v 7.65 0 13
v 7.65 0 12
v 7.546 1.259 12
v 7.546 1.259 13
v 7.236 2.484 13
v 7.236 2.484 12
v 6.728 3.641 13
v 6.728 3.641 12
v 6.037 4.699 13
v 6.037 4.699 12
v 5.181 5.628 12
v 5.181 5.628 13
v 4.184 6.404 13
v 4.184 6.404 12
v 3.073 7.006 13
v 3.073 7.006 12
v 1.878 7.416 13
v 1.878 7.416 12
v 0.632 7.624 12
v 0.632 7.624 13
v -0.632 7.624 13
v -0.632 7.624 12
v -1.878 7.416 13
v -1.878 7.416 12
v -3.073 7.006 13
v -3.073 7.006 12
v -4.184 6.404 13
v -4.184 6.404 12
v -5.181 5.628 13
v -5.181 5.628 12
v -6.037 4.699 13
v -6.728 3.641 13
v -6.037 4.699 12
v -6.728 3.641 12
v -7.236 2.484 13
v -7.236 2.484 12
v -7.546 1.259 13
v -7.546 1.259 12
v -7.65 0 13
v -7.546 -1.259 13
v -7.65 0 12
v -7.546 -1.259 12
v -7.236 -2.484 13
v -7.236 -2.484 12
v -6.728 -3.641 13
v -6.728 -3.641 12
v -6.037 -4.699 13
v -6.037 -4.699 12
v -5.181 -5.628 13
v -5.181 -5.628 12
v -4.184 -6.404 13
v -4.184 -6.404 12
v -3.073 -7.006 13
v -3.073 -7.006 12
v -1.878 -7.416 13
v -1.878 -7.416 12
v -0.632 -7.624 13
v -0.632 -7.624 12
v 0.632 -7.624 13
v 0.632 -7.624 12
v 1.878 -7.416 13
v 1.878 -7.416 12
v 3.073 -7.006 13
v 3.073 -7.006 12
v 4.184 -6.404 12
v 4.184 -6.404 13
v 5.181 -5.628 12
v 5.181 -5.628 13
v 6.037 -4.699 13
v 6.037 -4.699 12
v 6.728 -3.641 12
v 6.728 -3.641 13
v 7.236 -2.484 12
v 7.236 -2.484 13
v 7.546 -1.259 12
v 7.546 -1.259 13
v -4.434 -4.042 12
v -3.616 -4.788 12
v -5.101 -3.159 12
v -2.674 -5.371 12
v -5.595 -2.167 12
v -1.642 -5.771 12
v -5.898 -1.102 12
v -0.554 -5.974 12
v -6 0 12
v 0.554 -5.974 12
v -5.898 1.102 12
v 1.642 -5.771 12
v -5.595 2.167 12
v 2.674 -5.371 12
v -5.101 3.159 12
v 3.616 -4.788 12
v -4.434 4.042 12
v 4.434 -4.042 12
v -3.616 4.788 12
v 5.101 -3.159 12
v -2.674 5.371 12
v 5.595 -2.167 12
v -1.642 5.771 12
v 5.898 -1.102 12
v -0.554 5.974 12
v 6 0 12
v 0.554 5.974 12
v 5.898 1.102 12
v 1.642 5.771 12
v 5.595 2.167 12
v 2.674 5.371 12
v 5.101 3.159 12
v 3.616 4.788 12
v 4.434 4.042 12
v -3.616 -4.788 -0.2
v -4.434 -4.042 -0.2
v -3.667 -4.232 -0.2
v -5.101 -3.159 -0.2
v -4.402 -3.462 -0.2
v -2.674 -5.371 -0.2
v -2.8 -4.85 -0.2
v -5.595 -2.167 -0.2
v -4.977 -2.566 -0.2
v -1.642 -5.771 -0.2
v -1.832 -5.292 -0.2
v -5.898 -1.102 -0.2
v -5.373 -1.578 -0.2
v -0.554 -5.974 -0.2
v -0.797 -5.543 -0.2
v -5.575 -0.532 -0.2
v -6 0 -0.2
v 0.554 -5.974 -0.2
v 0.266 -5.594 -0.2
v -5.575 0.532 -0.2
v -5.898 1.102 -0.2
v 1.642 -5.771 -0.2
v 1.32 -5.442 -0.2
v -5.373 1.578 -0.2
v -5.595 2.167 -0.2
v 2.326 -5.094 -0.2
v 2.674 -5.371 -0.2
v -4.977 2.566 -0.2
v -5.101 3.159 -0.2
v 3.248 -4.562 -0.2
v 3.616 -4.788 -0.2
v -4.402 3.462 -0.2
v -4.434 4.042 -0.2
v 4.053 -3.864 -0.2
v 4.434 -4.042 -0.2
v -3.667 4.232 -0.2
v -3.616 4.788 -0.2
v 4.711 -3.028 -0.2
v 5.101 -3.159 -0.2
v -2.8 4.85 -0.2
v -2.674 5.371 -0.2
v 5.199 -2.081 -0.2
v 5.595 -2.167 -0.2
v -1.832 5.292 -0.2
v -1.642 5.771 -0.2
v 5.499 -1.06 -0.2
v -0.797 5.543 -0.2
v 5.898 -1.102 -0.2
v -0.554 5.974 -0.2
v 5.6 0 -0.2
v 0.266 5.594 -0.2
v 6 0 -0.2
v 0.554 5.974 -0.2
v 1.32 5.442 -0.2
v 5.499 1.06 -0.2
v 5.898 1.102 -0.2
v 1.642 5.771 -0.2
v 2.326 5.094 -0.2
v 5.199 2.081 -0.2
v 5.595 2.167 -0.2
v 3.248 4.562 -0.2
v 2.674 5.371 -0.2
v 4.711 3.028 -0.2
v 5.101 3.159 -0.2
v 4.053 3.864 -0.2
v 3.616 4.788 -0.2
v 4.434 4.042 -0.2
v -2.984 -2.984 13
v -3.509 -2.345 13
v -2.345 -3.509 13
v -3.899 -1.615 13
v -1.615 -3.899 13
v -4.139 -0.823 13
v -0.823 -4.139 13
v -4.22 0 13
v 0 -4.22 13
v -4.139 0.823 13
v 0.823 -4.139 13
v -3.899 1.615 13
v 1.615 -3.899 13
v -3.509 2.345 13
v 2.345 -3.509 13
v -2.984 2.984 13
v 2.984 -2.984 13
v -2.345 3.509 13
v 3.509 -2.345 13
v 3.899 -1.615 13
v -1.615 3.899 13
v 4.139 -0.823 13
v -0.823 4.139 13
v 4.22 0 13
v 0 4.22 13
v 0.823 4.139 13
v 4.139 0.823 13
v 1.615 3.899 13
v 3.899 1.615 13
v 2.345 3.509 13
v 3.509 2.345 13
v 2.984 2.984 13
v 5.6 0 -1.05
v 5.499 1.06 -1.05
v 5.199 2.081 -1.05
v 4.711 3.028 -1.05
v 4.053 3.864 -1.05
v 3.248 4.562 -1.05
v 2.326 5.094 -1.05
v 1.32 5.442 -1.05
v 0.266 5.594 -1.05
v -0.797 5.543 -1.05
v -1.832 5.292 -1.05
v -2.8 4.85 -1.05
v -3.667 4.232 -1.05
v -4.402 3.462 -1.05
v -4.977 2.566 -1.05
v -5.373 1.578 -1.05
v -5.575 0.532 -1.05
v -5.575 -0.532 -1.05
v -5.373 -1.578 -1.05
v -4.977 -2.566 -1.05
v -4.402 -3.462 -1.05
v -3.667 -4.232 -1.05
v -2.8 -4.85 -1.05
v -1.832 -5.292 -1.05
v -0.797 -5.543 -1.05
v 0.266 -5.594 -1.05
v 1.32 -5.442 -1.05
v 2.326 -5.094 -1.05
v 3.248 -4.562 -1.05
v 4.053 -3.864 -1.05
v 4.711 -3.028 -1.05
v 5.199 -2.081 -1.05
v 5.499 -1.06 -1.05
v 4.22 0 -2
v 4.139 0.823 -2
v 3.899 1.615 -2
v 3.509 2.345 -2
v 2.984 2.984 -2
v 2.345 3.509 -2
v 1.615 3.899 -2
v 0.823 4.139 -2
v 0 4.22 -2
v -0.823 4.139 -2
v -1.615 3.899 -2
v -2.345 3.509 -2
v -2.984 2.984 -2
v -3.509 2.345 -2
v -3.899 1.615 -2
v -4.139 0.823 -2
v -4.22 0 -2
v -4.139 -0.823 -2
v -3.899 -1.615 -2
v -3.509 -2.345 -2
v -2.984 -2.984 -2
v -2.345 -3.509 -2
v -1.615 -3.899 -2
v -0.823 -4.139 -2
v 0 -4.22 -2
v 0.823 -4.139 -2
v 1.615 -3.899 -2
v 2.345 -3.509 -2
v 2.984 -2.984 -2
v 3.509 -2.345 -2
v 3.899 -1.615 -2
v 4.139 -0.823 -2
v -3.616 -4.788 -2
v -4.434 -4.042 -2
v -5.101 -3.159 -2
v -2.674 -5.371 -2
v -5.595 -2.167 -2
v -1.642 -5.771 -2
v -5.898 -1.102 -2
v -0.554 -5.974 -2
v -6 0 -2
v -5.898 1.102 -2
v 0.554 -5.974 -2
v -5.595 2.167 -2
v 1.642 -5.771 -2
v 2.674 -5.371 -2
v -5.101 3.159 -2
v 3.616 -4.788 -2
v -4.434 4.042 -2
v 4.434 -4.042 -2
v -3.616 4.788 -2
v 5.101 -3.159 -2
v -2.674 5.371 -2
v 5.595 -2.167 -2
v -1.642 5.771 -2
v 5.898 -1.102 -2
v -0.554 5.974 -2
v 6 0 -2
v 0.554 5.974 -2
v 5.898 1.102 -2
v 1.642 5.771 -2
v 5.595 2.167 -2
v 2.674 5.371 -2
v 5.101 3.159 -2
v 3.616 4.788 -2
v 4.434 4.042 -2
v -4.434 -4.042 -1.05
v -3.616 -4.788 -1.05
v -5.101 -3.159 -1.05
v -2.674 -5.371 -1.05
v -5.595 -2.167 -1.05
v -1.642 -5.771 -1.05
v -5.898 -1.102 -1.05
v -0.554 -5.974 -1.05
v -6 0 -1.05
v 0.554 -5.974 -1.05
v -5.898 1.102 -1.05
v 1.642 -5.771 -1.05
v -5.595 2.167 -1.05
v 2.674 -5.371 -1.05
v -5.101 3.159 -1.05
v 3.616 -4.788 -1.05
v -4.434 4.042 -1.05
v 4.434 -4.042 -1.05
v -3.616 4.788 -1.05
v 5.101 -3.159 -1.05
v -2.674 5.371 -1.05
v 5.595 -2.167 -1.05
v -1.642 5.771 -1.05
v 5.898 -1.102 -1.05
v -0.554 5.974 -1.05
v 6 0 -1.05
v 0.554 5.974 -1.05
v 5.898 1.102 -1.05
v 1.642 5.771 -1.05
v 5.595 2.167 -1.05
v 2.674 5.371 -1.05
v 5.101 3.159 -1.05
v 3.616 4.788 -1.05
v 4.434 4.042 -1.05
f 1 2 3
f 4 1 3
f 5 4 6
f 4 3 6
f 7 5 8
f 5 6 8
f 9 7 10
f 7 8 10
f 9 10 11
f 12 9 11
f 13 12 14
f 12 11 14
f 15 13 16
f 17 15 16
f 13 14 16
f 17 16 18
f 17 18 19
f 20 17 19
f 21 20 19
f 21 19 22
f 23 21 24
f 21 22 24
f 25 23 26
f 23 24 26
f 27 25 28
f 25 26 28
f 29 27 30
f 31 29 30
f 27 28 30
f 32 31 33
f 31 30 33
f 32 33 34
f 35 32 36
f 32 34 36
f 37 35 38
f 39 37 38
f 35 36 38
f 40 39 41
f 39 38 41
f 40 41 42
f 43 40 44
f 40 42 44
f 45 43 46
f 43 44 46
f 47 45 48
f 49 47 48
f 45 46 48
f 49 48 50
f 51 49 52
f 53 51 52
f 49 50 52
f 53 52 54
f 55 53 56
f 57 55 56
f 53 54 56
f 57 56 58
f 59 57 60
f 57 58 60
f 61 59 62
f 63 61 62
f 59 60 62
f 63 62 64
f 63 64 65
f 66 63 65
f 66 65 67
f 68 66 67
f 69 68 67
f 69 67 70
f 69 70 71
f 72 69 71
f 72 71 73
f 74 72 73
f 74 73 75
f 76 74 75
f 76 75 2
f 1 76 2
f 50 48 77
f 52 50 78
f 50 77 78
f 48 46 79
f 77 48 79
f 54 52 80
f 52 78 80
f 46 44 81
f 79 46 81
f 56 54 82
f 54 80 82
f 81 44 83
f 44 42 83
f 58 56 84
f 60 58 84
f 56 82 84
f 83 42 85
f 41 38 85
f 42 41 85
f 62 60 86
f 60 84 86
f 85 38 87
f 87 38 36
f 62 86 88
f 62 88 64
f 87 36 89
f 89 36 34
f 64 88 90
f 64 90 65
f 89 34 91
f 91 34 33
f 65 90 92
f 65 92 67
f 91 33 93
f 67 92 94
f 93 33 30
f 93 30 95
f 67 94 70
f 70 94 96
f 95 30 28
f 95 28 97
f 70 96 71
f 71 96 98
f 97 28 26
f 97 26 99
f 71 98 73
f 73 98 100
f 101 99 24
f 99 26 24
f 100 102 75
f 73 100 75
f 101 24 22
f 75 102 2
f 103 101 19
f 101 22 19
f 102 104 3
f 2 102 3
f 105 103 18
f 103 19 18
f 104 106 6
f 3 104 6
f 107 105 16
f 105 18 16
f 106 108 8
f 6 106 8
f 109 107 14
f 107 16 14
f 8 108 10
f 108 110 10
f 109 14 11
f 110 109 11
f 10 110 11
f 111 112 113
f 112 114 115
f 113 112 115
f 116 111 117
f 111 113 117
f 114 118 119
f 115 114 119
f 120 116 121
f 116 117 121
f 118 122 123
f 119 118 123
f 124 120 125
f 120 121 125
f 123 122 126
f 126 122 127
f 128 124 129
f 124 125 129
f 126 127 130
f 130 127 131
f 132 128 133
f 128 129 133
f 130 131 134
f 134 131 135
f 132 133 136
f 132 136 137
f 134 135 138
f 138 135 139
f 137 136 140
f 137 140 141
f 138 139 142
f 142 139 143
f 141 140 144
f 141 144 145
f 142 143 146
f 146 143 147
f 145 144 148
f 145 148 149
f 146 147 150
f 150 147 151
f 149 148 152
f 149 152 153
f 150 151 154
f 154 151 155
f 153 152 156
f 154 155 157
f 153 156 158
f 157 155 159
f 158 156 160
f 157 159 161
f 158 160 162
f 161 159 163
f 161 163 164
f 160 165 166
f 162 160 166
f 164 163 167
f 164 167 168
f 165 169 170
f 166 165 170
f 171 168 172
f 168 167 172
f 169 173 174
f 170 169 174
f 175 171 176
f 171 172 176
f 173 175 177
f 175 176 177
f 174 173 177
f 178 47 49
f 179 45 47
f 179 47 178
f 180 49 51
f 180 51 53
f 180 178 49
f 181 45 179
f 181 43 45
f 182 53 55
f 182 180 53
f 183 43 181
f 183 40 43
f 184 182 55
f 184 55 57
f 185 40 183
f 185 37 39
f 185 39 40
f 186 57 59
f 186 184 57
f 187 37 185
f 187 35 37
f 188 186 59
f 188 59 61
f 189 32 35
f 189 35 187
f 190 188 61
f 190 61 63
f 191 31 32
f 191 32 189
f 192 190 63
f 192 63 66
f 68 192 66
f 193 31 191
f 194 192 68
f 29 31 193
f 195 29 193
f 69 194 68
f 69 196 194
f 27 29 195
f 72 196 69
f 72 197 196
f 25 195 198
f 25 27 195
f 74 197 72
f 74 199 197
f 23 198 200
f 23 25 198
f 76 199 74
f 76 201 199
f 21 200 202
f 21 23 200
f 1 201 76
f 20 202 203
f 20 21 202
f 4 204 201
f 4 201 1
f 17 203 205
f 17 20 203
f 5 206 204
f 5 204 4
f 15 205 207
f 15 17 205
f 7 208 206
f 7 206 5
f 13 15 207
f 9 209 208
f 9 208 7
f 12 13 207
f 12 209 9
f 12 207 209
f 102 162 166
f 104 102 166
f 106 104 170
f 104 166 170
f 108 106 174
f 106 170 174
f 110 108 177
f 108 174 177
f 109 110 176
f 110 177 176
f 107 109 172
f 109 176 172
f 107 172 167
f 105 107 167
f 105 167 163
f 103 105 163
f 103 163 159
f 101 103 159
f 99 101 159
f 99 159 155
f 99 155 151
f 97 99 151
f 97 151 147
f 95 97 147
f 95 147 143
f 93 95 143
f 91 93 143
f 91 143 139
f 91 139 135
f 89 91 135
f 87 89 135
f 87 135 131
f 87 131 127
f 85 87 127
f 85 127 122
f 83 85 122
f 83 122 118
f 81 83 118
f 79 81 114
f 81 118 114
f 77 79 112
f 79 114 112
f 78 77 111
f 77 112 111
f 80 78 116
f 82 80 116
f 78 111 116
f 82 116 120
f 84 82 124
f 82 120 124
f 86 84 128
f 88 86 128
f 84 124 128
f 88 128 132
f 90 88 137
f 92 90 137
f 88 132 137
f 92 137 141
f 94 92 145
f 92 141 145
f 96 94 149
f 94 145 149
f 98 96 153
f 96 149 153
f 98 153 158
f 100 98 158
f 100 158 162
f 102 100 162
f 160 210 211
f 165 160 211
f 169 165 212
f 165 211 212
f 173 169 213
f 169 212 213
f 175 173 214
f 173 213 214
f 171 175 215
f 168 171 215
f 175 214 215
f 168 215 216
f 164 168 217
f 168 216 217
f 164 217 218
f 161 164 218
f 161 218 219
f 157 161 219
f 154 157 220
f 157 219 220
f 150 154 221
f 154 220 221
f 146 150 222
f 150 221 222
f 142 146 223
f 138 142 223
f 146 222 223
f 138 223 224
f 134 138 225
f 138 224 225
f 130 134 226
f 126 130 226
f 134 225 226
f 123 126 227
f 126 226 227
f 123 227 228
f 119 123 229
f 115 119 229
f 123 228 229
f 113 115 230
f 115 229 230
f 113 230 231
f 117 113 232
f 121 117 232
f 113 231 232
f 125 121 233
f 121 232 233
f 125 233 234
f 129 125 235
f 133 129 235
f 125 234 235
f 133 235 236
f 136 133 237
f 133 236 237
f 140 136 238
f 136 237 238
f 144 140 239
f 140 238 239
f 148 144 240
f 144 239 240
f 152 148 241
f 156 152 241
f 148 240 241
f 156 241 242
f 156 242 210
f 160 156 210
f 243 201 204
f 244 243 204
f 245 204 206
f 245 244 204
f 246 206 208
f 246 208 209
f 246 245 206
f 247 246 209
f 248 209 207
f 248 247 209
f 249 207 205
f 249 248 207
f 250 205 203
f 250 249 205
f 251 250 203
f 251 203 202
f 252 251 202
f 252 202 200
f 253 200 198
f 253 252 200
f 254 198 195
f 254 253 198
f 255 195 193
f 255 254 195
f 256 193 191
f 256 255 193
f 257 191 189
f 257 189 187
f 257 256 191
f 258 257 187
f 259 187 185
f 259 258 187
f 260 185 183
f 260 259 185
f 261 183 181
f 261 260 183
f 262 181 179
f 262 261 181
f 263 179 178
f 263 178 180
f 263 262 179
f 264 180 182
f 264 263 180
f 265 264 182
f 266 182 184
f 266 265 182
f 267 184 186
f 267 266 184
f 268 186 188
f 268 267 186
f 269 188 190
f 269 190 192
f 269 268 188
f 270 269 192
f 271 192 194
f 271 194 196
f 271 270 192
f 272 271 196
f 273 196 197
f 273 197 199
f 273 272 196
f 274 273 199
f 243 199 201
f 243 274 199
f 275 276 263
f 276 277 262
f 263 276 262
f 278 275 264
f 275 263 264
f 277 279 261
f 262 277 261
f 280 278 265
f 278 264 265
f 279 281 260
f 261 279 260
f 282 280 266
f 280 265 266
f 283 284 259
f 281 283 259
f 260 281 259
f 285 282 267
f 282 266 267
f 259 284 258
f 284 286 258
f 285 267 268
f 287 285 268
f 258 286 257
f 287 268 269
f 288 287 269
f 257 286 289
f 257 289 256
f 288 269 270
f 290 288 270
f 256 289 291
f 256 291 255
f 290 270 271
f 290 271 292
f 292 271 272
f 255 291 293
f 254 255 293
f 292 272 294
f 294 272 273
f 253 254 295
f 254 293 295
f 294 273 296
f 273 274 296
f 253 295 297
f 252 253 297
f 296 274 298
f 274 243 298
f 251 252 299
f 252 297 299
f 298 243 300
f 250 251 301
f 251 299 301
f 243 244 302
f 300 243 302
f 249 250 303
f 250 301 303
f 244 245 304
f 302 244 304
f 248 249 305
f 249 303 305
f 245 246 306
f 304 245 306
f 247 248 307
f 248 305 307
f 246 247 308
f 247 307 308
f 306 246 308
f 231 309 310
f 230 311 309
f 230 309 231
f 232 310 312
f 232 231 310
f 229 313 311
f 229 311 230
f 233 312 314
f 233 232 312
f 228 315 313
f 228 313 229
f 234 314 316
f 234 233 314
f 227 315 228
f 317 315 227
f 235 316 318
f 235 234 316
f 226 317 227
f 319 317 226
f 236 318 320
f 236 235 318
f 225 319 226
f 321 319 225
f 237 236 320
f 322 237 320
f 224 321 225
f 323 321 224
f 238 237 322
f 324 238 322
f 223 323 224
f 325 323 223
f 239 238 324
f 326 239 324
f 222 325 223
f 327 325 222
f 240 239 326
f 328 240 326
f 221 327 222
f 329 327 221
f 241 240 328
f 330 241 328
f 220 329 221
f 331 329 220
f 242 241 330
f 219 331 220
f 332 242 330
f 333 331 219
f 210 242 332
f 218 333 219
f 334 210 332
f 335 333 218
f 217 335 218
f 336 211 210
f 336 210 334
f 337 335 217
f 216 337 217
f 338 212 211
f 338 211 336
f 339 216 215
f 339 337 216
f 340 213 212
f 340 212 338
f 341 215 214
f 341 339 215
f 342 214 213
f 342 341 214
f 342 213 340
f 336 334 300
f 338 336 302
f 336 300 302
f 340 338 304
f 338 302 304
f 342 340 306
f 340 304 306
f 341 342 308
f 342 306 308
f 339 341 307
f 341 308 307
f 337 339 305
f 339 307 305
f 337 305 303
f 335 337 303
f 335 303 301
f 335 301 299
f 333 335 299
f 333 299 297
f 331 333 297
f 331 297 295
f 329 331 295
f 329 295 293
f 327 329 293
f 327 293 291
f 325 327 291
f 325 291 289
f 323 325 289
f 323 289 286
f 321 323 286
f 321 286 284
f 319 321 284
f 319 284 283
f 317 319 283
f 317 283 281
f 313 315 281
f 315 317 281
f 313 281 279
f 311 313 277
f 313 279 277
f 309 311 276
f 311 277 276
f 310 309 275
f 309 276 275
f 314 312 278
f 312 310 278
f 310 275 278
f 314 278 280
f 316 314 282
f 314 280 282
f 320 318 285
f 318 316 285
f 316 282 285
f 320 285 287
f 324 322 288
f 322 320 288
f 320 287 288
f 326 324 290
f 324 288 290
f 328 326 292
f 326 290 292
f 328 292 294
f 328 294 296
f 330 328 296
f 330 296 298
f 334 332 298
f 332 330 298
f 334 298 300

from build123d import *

# Parameters (mm, degrees)
F_01_START                                = -2
S01_GROUND_GUIDE_BORE_AND_BODY_R          = 6
S01_GROUND_GUIDE_BORE_AND_BODY_R_2        = 4.22
F_01_GROUND_GUIDE_BORE_AND_BODY_DEPTH     = 14
F_02_START                                = 12
S02_OUTBOARD_FLANGE_R                     = 7.65
S02_OUTBOARD_FLANGE_R_2                   = 4.22
F_02_OUTBOARD_FLANGE_DEPTH                = 1
F_03_START                                = -1.05
S03_EXTERNAL_RETAINING_RING_GROOVE_R      = 6.1
S03_EXTERNAL_RETAINING_RING_GROOVE_R_2    = 5.6
F_03_EXTERNAL_RETAINING_RING_GROOVE_DEPTH = 0.85


with BuildPart() as part:
    # S01 - Ground guide bore and body → 01 - Ground guide bore and body (new body)
    with BuildSketch(Plane.XY.offset(F_01_START)):
        Circle(S01_GROUND_GUIDE_BORE_AND_BODY_R)
        Circle(S01_GROUND_GUIDE_BORE_AND_BODY_R_2, mode=Mode.SUBTRACT)
    extrude(amount=F_01_GROUND_GUIDE_BORE_AND_BODY_DEPTH)

    # S02 - Outboard flange → 02 - Outboard flange (add)
    with BuildSketch(Plane.XY.offset(F_02_START)):
        Circle(S02_OUTBOARD_FLANGE_R)
        Circle(S02_OUTBOARD_FLANGE_R_2, mode=Mode.SUBTRACT)
    extrude(amount=F_02_OUTBOARD_FLANGE_DEPTH)

    # S03 - External retaining ring groove → 03 - External retaining ring groove (cut)
    with BuildSketch(Plane.XY.offset(F_03_START)):
        Circle(S03_EXTERNAL_RETAINING_RING_GROOVE_R)
        Circle(S03_EXTERNAL_RETAINING_RING_GROOVE_R_2, mode=Mode.SUBTRACT)
    extrude(amount=F_03_EXTERNAL_RETAINING_RING_GROOVE_DEPTH, mode=Mode.SUBTRACT)


solid = part.part
